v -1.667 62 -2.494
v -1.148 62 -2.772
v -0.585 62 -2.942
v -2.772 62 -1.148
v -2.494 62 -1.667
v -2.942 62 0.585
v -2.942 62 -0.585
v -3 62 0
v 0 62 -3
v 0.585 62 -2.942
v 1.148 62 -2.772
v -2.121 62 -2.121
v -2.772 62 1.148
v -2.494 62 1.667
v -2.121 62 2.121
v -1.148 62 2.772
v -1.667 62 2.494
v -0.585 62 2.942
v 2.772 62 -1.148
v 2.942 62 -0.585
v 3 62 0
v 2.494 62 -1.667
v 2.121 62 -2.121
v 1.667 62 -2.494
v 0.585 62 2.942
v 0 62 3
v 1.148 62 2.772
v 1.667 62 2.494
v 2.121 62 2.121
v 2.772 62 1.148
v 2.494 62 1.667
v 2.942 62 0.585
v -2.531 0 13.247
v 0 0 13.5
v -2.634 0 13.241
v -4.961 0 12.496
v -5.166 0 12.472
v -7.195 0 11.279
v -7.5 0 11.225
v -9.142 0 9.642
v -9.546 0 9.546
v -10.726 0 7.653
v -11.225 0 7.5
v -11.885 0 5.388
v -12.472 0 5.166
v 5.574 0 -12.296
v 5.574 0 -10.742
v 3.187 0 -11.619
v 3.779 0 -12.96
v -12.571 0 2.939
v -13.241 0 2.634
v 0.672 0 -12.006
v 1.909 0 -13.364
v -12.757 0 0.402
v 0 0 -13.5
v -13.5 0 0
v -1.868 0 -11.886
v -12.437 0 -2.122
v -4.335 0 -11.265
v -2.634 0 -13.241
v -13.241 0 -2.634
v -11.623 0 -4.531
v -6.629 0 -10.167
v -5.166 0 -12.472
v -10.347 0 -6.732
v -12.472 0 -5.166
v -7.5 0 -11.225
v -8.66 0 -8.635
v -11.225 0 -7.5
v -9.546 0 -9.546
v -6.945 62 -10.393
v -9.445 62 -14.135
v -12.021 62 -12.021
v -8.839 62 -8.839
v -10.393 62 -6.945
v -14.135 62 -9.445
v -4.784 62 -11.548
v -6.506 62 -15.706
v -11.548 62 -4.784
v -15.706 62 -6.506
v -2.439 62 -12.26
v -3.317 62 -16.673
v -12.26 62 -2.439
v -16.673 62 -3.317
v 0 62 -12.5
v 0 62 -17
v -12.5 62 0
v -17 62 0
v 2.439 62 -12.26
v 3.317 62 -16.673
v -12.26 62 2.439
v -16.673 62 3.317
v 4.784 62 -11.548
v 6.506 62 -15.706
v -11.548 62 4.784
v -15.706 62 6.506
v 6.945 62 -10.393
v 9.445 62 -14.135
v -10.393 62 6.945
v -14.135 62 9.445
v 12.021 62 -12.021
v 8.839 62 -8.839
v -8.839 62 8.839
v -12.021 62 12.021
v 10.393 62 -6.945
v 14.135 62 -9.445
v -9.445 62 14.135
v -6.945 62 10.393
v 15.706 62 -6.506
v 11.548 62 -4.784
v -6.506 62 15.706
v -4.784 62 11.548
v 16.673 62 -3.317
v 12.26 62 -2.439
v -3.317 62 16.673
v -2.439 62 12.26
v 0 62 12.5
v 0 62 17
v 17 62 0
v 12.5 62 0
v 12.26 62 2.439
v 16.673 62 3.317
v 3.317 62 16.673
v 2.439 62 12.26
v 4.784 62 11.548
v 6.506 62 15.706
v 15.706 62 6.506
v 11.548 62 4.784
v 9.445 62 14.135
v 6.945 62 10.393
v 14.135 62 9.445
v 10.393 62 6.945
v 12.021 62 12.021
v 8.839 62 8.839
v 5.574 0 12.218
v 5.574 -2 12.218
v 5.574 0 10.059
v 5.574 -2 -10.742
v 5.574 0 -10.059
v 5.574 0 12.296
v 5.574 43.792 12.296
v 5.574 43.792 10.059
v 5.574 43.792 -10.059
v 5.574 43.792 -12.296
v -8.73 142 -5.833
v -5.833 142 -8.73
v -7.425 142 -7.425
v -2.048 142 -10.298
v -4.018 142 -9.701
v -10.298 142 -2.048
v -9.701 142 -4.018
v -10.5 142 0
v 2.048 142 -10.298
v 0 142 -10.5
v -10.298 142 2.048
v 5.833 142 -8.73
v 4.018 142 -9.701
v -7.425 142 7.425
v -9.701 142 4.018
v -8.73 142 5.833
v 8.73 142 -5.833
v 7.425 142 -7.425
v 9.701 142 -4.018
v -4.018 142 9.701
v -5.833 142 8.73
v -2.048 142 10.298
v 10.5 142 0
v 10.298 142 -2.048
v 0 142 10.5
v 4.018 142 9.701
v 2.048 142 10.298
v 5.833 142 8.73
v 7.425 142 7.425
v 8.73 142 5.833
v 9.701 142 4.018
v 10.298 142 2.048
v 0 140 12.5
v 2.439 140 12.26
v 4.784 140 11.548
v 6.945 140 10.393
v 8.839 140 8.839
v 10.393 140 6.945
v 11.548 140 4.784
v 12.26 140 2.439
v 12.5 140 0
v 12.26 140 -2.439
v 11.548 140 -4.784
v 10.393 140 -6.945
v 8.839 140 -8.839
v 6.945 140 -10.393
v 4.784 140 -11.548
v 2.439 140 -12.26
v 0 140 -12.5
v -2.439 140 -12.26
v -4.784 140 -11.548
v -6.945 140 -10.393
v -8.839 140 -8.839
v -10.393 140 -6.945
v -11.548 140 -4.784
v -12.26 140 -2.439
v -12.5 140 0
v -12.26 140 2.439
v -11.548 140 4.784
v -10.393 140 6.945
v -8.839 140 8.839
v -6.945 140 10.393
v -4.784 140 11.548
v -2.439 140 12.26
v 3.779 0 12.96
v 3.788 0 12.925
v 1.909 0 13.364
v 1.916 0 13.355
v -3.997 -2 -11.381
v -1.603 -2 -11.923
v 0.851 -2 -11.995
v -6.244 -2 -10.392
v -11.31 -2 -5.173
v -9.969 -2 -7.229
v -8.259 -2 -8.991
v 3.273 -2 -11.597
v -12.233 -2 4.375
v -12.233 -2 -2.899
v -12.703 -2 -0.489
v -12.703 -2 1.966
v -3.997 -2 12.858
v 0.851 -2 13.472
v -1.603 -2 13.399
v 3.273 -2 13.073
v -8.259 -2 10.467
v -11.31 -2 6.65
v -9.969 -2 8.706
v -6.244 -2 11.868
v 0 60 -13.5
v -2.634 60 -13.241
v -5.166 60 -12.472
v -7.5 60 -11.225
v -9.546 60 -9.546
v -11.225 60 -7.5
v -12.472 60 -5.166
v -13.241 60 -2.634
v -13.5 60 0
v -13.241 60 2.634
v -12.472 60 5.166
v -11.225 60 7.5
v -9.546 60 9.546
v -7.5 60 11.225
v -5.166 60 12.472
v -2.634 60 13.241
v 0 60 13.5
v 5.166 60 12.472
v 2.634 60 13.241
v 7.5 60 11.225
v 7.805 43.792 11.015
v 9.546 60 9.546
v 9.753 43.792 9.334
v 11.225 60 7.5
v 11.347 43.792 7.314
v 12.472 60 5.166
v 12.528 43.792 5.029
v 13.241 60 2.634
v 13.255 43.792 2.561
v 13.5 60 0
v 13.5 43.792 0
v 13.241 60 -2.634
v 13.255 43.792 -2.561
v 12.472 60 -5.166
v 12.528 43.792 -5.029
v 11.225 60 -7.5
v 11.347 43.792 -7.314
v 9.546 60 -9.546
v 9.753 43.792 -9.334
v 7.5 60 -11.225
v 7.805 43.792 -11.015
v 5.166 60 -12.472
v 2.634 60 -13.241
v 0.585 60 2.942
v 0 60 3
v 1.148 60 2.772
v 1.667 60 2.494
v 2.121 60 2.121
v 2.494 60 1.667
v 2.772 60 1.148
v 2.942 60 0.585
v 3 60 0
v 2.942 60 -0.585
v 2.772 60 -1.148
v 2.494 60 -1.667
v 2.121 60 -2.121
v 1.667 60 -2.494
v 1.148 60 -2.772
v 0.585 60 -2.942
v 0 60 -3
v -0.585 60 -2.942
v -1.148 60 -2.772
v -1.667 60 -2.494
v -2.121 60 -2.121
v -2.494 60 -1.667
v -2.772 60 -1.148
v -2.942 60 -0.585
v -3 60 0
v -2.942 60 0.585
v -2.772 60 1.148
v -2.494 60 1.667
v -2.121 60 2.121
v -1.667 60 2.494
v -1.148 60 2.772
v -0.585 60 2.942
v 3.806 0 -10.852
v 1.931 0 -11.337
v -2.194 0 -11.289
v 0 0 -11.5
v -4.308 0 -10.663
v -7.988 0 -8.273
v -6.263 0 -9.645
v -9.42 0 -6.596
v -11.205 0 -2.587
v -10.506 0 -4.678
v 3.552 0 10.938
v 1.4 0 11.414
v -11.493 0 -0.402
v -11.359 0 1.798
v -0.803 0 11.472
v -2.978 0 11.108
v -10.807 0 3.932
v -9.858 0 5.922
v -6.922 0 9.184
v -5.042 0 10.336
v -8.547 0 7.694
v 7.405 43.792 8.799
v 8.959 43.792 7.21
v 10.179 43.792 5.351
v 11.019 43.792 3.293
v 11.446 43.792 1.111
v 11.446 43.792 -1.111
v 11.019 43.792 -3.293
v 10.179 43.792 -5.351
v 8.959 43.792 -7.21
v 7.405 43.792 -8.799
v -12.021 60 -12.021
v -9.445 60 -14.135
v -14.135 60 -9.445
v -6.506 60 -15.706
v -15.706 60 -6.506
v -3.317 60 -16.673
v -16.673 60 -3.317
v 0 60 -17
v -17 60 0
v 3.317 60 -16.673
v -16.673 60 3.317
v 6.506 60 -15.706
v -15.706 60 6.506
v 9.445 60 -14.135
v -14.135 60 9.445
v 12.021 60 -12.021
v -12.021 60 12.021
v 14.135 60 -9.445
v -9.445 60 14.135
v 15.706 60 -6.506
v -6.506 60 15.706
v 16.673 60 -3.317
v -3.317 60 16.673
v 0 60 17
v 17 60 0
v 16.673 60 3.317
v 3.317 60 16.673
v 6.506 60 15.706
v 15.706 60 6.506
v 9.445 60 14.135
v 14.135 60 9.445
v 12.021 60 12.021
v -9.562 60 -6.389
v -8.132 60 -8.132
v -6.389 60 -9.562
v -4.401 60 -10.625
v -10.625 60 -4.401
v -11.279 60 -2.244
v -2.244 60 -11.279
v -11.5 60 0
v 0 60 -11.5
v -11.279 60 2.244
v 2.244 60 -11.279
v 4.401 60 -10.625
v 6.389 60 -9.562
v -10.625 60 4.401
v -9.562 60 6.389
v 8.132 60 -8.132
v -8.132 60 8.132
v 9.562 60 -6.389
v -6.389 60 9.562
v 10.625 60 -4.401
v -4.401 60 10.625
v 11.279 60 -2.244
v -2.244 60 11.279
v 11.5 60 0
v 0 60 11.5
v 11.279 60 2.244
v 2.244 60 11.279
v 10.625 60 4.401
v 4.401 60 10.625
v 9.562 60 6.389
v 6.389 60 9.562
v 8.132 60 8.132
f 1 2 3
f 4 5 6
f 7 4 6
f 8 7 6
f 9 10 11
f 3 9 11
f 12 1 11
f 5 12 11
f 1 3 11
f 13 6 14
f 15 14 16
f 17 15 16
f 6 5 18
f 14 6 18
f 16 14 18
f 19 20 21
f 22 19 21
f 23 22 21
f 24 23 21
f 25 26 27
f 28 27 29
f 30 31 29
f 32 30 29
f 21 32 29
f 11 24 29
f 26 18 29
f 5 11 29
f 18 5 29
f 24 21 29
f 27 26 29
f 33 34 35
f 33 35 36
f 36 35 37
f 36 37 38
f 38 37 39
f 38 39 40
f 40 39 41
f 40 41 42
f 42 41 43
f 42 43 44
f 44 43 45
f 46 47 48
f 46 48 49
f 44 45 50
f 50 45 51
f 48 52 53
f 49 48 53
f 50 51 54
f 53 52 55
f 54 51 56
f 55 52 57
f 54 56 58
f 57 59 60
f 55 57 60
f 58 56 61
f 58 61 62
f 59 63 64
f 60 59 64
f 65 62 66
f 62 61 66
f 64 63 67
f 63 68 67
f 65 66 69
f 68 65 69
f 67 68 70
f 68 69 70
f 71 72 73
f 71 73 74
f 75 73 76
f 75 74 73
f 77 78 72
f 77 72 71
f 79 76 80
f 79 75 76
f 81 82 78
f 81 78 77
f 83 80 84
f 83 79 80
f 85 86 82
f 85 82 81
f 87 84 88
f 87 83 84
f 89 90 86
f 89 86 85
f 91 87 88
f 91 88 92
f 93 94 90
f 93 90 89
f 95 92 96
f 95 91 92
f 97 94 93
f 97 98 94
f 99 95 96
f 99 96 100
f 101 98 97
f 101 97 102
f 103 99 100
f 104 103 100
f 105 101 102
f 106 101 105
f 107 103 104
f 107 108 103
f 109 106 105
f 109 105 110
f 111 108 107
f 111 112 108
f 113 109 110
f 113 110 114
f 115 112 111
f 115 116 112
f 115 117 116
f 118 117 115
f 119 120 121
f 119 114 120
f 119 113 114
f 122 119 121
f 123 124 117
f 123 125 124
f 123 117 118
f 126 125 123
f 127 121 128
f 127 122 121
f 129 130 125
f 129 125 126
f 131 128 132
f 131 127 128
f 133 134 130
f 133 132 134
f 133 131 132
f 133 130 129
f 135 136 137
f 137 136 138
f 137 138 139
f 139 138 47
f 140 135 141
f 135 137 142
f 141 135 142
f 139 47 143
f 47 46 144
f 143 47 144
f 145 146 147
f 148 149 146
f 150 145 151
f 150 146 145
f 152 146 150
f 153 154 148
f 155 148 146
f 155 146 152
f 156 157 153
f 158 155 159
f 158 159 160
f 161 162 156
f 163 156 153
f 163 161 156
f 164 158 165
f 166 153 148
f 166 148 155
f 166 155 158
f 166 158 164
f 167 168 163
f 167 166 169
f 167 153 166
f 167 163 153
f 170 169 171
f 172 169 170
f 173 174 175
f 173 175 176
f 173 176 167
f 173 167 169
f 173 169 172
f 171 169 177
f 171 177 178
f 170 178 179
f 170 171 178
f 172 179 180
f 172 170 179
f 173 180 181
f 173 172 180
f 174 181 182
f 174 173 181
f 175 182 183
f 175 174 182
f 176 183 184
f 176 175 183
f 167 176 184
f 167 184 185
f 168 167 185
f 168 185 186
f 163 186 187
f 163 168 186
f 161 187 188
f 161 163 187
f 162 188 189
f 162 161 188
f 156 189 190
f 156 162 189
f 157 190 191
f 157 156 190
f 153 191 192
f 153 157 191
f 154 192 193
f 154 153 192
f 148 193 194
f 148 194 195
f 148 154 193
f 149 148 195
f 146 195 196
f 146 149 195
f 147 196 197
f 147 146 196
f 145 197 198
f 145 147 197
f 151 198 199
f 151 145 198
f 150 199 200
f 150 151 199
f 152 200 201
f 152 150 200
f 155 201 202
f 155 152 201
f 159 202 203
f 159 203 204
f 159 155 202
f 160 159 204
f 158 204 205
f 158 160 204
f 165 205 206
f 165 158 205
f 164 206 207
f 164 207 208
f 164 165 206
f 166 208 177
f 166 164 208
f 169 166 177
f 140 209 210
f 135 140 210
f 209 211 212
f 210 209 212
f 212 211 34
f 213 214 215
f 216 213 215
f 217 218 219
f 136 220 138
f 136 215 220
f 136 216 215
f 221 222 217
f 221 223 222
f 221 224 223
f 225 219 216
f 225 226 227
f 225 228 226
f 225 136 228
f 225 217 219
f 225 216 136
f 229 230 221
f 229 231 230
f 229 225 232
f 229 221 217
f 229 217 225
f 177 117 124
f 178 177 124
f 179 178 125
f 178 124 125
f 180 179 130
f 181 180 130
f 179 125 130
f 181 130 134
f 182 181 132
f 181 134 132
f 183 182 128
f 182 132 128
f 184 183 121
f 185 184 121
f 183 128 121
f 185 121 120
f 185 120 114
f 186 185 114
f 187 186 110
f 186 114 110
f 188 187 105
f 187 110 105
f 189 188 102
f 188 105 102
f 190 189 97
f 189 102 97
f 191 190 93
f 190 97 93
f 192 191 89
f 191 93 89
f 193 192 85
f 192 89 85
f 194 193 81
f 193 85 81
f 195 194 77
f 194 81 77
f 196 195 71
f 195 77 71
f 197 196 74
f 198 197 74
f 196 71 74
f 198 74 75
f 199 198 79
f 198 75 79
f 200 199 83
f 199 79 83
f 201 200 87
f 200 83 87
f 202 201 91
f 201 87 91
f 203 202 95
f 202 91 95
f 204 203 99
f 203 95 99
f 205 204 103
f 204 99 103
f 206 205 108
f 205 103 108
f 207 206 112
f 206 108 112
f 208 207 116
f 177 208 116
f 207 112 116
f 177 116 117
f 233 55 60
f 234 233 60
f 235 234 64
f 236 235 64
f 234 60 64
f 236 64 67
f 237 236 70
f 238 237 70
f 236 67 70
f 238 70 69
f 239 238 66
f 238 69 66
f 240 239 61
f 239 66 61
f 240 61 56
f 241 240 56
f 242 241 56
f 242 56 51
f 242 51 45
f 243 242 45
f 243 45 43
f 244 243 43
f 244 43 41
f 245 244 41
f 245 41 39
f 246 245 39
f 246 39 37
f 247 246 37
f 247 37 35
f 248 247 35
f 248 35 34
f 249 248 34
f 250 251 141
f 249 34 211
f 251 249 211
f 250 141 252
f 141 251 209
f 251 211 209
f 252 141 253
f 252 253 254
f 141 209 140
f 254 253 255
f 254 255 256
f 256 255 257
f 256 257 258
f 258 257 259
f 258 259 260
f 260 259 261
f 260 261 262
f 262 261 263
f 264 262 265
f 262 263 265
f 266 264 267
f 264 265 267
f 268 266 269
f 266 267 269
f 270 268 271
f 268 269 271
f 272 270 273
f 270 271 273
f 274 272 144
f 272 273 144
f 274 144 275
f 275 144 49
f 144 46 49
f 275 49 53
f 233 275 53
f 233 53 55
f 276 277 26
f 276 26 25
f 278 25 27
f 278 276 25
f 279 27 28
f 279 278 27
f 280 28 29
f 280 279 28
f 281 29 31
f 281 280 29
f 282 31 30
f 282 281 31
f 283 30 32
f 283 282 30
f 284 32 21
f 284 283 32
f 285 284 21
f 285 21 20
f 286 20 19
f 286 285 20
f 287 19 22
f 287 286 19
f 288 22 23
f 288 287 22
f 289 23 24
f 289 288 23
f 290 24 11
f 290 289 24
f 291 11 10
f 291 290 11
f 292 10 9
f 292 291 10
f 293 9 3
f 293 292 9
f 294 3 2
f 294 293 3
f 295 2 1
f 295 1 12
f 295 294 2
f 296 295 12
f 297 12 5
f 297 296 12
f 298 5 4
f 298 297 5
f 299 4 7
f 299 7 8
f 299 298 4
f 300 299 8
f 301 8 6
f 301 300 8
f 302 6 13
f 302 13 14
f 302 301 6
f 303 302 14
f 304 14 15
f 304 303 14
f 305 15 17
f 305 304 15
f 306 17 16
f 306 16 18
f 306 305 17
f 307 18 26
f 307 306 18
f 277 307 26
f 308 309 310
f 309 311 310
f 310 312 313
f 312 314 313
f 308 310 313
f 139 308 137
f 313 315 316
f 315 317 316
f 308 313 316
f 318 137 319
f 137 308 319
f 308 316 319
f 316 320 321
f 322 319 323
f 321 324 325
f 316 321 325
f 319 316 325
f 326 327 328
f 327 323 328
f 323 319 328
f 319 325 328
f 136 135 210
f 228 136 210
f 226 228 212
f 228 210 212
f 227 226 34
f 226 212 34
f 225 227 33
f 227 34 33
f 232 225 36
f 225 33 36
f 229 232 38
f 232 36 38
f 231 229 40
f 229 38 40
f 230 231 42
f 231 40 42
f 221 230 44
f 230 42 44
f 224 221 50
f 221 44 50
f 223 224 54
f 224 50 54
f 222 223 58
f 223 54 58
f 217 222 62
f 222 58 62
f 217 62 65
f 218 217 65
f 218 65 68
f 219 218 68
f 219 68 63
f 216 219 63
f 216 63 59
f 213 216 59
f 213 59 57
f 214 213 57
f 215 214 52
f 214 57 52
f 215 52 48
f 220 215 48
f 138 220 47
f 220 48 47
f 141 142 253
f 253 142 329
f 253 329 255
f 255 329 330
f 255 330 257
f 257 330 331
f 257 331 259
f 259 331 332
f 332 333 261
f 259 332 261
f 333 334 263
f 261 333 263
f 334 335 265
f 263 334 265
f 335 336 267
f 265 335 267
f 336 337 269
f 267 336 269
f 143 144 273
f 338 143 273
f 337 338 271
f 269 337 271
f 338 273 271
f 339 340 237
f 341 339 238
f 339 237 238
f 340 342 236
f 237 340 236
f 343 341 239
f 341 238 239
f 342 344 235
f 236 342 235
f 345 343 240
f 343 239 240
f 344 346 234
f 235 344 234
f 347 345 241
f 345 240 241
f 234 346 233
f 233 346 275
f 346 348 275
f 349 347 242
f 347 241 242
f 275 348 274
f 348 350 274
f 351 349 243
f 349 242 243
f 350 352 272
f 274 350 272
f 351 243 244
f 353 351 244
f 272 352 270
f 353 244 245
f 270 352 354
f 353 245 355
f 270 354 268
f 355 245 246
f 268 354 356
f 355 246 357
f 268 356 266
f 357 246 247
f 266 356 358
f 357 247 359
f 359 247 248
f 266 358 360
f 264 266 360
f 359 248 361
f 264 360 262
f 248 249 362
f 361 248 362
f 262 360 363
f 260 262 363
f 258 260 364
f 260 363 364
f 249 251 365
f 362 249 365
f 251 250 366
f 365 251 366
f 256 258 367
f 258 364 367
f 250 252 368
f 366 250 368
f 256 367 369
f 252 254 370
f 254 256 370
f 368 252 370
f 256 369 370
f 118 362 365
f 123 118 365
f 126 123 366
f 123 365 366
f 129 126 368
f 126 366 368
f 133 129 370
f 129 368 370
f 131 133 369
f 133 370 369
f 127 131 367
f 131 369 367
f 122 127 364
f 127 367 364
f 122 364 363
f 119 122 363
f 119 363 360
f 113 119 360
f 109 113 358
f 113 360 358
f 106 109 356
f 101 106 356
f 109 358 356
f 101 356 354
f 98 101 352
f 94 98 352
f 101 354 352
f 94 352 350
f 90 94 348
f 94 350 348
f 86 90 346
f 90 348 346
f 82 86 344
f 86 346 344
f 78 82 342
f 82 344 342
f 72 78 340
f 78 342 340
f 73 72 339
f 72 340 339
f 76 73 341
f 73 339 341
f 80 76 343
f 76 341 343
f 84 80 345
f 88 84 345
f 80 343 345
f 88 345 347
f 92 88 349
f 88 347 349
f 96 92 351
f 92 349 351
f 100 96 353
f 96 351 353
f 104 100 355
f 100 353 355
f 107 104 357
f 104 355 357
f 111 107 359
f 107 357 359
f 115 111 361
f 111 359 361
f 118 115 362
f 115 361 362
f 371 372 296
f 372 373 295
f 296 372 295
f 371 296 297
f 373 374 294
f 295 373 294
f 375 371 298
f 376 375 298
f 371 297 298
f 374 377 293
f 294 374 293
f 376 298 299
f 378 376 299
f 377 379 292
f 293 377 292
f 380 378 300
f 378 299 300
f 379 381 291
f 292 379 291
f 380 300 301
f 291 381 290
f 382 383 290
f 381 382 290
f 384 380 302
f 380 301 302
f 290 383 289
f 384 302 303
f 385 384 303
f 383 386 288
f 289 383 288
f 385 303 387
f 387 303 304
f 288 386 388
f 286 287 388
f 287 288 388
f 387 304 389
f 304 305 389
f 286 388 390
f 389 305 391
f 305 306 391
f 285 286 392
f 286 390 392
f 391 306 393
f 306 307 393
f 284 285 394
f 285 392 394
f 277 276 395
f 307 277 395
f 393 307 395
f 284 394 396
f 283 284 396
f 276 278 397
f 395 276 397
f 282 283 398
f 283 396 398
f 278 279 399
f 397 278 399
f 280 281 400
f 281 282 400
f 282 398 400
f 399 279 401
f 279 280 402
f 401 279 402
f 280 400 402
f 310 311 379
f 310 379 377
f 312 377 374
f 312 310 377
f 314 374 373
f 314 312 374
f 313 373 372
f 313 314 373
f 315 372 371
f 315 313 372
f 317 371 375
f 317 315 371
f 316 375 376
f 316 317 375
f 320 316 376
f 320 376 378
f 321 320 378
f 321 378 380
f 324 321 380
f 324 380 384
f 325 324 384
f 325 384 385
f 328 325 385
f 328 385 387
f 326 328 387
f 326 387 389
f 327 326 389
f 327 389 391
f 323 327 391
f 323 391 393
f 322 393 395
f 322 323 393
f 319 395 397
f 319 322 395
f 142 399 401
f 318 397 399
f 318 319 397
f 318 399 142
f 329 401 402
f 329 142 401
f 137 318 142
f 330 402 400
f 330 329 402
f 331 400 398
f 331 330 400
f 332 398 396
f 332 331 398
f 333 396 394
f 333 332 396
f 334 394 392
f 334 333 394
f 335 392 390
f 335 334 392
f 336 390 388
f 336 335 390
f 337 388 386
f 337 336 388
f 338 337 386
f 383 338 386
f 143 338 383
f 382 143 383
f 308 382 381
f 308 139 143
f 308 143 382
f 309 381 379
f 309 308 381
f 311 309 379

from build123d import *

# Parameters (mm, degrees)
SKETCH1_R               = 13.5
SKETCH1_R_2             = 11.5
BOSS_EXTRUDE1_DEPTH     = 60
SKETCH2_R               = 12.761832135
BOSS_EXTRUDE2_DEPTH     = 2
CUT_EXTRUDE1_DEPTH      = 63.964275585
CUT_EXTRUDE1_DEPTH_BACK = 63.964275585
SKETCH3_W               = 21.152552615
SKETCH3_H               = 52.02384562
SKETCH4_R               = 17
SKETCH4_R_2             = 3
BOSS_EXTRUDE3_DEPTH     = 2
SKETCH5_R               = 12.5
BOSS_EXTRUDE4_DEPTH     = 80
CHAMFER1_SIZE           = 2


with BuildPart() as part:
    # Sketch1 → Boss-Extrude1 (new body)
    with BuildSketch(Plane(origin=(0, 0, 0), x_dir=(1, 0, 0), z_dir=(0, 1, 0))):
        with Locations(Location((0, 0, 0), (0, 0, 90))):
            Circle(SKETCH1_R)
        with Locations(Location((0, 0, 0), (0, 0, 90))):
            Circle(SKETCH1_R_2, mode=Mode.SUBTRACT)
    extrude(amount=BOSS_EXTRUDE1_DEPTH)

    # Sketch2 → Boss-Extrude2 (add)
    with BuildSketch(Plane.XZ):
        with Locations(Location((0, 0.738167865, 0), (0, 0, 90))):
            Circle(SKETCH2_R)
    extrude(amount=BOSS_EXTRUDE2_DEPTH)

    # Sketch3 → Cut-Extrude1 (cut, two sides: drawn at the far end of the back side and taken through both)
    with BuildSketch(Plane.XY.offset(-CUT_EXTRUDE1_DEPTH_BACK)):
        with Locations((16.150259766, 17.780571755)):
            Rectangle(SKETCH3_W, SKETCH3_H)
    extrude(amount=CUT_EXTRUDE1_DEPTH + CUT_EXTRUDE1_DEPTH_BACK, mode=Mode.SUBTRACT)

    # Sketch4 → Boss-Extrude3 (add)
    with BuildSketch(Plane(origin=(0, 60, 0), x_dir=(1, 0, 0), z_dir=(0, 1, 0))):
        with Locations(Location((0, 0, 0), (0, 0, 270))):
            Circle(SKETCH4_R)
        with Locations(Location((0, 0, 0), (0, 0, 270))):
            Circle(SKETCH4_R_2, mode=Mode.SUBTRACT)
    extrude(amount=BOSS_EXTRUDE3_DEPTH)

    # Sketch5 → Boss-Extrude4 (add)
    with BuildSketch(Plane(origin=(0, 62, 0), x_dir=(1, 0, 0), z_dir=(0, 1, 0))):
        with Locations(Location((0, 0, 0), (0, 0, 270))):
            Circle(SKETCH5_R)
    extrude(amount=BOSS_EXTRUDE4_DEPTH)

    # Chamfer1
    chamfer1_edges = [part.edges().sort_by_distance(p)[0] for p in [
        (0, 142, -12.5),
    ]]
    chamfer(chamfer1_edges, length=CHAMFER1_SIZE)


solid = part.part
